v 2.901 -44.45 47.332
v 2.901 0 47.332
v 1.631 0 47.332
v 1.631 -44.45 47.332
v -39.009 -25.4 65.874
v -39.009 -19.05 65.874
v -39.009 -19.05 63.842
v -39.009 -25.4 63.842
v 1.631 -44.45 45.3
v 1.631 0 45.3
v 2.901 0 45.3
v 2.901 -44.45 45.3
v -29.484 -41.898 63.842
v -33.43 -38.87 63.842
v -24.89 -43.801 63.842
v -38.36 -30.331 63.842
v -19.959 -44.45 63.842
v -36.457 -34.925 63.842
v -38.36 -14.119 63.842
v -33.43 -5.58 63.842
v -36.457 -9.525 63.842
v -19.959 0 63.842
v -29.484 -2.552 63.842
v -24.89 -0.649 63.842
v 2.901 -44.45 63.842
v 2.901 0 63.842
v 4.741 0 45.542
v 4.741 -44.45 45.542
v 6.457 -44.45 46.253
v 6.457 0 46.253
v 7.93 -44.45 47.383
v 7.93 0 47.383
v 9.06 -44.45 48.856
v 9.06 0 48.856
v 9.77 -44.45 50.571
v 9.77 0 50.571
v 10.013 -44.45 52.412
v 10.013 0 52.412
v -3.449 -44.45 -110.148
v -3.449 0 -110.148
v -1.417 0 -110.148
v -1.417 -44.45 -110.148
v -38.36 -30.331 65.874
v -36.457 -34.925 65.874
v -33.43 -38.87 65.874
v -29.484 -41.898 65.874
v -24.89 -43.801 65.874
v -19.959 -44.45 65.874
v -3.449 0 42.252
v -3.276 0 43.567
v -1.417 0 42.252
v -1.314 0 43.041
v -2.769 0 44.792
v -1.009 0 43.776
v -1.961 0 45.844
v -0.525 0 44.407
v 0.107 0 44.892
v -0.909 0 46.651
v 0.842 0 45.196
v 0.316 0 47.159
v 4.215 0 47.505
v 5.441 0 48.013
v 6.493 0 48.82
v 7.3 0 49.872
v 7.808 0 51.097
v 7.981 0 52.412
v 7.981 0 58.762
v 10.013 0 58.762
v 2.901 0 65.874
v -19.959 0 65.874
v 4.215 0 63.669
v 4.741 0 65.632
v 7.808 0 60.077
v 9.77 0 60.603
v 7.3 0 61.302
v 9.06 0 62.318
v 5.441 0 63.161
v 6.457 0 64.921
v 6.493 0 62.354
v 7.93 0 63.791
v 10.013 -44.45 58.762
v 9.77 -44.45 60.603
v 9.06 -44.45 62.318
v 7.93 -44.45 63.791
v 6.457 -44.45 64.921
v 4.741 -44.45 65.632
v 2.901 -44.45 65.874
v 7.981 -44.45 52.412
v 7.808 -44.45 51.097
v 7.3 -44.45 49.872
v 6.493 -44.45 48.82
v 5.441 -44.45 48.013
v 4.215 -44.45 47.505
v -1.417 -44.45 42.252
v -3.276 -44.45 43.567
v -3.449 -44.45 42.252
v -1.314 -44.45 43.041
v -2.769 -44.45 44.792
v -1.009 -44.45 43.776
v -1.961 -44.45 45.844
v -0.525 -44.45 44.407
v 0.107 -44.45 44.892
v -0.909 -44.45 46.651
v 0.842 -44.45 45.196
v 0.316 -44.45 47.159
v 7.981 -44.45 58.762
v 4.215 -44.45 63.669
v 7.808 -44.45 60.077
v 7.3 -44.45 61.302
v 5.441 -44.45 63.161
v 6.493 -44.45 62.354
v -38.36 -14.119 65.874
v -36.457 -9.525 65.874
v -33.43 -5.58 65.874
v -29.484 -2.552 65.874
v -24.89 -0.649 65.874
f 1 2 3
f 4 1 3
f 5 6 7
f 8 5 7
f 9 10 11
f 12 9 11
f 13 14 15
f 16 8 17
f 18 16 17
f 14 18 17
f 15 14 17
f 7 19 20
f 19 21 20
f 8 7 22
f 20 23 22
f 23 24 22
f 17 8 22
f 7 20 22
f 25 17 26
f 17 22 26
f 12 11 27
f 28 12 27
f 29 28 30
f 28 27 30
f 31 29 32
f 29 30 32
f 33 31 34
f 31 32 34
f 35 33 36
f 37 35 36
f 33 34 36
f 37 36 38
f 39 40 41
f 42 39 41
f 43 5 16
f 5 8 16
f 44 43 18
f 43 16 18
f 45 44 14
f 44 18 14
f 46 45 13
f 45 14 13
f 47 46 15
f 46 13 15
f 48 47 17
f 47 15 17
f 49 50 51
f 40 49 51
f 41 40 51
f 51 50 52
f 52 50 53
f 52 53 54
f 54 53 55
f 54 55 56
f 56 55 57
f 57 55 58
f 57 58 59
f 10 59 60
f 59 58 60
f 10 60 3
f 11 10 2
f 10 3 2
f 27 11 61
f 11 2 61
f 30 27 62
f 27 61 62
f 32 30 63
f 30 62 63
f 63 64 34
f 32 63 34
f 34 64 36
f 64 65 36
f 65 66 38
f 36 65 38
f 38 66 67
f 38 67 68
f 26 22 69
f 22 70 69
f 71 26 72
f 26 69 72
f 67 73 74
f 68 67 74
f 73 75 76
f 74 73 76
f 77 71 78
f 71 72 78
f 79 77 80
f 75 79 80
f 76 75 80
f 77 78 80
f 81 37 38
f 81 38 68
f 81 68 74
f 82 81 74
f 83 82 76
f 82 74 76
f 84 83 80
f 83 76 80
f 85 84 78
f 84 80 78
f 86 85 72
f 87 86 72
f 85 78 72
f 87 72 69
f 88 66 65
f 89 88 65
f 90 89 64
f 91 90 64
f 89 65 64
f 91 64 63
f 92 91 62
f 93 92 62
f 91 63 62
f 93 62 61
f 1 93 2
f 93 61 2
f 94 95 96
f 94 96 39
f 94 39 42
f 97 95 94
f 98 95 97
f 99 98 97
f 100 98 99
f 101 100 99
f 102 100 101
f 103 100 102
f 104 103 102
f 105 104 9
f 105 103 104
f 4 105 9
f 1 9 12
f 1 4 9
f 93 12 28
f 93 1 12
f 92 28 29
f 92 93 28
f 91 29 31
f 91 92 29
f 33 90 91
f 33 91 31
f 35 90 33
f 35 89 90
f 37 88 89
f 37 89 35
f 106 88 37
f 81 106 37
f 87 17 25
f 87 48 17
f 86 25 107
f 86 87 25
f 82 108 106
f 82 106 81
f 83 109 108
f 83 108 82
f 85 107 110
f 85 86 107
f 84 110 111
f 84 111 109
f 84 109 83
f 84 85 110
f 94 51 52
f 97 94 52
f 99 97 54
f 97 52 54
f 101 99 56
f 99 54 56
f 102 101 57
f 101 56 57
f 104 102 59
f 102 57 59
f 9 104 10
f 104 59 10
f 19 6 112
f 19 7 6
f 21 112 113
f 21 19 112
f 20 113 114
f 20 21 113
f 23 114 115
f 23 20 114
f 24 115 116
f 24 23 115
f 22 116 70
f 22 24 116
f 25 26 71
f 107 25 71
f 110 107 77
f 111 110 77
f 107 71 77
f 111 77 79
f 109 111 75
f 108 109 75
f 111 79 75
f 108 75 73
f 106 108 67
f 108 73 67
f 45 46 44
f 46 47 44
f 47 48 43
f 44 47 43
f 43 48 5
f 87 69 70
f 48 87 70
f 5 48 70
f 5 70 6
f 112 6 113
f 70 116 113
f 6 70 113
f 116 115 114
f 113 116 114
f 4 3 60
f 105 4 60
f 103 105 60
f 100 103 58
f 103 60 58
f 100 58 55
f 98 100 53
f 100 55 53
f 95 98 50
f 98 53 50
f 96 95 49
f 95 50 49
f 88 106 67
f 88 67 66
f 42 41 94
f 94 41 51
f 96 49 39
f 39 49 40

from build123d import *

# Parameters (mm, degrees)
F1_DEPTH = 44.45
F2_R     = 19.05


with BuildPart() as f1:
    # F0 (on Front) → F1 (new body)
    with BuildSketch(Plane.XZ):
        with BuildLine():
            Line((-39.009379, 65.874033), (-39.009379, 63.842033))
            Line((-39.009379, 63.842033), (2.900621, 63.842033))
            ThreePointArc((2.900621, 63.842033), (6.492723, 62.354135), (7.980621, 58.762033))
            Line((7.980621, 58.762033), (7.980621, 52.412033))
            ThreePointArc((7.980621, 52.412033), (6.492723, 48.81993), (2.900621, 47.332033))
            Line((2.900621, 47.332033), (1.630621, 47.332033))
            ThreePointArc((1.630621, 47.332033), (-1.961481, 45.844135), (-3.449379, 42.252033))
            Line((-3.449379, 42.252033), (-3.449379, -110.147967))
            Line((-3.449379, -110.147967), (-1.417379, -110.147967))
            Line((-1.417379, -110.147967), (-1.417379, 42.252033))
            ThreePointArc((-1.417379, 42.252033), (-0.52464, 44.407294), (1.630621, 45.300033))
            Line((1.630621, 45.300033), (2.900621, 45.300033))
            ThreePointArc((2.900621, 45.300033), (7.929564, 47.383089), (10.012621, 52.412033))
            Line((10.012621, 52.412033), (10.012621, 58.762033))
            ThreePointArc((10.012621, 58.762033), (7.929564, 63.790976), (2.900621, 65.874033))
            Line((2.900621, 65.874033), (-39.009379, 65.874033))
        make_face()
    extrude(amount=F1_DEPTH)

    # F2
    f2_edges = [f1.edges().sort_by_distance(p)[0] for p in [
        (-39.009379, 0, 64.858033),
        (-39.009379, -44.45, 64.858033),
    ]]
    fillet(f2_edges, radius=F2_R)


solid = f1.part
